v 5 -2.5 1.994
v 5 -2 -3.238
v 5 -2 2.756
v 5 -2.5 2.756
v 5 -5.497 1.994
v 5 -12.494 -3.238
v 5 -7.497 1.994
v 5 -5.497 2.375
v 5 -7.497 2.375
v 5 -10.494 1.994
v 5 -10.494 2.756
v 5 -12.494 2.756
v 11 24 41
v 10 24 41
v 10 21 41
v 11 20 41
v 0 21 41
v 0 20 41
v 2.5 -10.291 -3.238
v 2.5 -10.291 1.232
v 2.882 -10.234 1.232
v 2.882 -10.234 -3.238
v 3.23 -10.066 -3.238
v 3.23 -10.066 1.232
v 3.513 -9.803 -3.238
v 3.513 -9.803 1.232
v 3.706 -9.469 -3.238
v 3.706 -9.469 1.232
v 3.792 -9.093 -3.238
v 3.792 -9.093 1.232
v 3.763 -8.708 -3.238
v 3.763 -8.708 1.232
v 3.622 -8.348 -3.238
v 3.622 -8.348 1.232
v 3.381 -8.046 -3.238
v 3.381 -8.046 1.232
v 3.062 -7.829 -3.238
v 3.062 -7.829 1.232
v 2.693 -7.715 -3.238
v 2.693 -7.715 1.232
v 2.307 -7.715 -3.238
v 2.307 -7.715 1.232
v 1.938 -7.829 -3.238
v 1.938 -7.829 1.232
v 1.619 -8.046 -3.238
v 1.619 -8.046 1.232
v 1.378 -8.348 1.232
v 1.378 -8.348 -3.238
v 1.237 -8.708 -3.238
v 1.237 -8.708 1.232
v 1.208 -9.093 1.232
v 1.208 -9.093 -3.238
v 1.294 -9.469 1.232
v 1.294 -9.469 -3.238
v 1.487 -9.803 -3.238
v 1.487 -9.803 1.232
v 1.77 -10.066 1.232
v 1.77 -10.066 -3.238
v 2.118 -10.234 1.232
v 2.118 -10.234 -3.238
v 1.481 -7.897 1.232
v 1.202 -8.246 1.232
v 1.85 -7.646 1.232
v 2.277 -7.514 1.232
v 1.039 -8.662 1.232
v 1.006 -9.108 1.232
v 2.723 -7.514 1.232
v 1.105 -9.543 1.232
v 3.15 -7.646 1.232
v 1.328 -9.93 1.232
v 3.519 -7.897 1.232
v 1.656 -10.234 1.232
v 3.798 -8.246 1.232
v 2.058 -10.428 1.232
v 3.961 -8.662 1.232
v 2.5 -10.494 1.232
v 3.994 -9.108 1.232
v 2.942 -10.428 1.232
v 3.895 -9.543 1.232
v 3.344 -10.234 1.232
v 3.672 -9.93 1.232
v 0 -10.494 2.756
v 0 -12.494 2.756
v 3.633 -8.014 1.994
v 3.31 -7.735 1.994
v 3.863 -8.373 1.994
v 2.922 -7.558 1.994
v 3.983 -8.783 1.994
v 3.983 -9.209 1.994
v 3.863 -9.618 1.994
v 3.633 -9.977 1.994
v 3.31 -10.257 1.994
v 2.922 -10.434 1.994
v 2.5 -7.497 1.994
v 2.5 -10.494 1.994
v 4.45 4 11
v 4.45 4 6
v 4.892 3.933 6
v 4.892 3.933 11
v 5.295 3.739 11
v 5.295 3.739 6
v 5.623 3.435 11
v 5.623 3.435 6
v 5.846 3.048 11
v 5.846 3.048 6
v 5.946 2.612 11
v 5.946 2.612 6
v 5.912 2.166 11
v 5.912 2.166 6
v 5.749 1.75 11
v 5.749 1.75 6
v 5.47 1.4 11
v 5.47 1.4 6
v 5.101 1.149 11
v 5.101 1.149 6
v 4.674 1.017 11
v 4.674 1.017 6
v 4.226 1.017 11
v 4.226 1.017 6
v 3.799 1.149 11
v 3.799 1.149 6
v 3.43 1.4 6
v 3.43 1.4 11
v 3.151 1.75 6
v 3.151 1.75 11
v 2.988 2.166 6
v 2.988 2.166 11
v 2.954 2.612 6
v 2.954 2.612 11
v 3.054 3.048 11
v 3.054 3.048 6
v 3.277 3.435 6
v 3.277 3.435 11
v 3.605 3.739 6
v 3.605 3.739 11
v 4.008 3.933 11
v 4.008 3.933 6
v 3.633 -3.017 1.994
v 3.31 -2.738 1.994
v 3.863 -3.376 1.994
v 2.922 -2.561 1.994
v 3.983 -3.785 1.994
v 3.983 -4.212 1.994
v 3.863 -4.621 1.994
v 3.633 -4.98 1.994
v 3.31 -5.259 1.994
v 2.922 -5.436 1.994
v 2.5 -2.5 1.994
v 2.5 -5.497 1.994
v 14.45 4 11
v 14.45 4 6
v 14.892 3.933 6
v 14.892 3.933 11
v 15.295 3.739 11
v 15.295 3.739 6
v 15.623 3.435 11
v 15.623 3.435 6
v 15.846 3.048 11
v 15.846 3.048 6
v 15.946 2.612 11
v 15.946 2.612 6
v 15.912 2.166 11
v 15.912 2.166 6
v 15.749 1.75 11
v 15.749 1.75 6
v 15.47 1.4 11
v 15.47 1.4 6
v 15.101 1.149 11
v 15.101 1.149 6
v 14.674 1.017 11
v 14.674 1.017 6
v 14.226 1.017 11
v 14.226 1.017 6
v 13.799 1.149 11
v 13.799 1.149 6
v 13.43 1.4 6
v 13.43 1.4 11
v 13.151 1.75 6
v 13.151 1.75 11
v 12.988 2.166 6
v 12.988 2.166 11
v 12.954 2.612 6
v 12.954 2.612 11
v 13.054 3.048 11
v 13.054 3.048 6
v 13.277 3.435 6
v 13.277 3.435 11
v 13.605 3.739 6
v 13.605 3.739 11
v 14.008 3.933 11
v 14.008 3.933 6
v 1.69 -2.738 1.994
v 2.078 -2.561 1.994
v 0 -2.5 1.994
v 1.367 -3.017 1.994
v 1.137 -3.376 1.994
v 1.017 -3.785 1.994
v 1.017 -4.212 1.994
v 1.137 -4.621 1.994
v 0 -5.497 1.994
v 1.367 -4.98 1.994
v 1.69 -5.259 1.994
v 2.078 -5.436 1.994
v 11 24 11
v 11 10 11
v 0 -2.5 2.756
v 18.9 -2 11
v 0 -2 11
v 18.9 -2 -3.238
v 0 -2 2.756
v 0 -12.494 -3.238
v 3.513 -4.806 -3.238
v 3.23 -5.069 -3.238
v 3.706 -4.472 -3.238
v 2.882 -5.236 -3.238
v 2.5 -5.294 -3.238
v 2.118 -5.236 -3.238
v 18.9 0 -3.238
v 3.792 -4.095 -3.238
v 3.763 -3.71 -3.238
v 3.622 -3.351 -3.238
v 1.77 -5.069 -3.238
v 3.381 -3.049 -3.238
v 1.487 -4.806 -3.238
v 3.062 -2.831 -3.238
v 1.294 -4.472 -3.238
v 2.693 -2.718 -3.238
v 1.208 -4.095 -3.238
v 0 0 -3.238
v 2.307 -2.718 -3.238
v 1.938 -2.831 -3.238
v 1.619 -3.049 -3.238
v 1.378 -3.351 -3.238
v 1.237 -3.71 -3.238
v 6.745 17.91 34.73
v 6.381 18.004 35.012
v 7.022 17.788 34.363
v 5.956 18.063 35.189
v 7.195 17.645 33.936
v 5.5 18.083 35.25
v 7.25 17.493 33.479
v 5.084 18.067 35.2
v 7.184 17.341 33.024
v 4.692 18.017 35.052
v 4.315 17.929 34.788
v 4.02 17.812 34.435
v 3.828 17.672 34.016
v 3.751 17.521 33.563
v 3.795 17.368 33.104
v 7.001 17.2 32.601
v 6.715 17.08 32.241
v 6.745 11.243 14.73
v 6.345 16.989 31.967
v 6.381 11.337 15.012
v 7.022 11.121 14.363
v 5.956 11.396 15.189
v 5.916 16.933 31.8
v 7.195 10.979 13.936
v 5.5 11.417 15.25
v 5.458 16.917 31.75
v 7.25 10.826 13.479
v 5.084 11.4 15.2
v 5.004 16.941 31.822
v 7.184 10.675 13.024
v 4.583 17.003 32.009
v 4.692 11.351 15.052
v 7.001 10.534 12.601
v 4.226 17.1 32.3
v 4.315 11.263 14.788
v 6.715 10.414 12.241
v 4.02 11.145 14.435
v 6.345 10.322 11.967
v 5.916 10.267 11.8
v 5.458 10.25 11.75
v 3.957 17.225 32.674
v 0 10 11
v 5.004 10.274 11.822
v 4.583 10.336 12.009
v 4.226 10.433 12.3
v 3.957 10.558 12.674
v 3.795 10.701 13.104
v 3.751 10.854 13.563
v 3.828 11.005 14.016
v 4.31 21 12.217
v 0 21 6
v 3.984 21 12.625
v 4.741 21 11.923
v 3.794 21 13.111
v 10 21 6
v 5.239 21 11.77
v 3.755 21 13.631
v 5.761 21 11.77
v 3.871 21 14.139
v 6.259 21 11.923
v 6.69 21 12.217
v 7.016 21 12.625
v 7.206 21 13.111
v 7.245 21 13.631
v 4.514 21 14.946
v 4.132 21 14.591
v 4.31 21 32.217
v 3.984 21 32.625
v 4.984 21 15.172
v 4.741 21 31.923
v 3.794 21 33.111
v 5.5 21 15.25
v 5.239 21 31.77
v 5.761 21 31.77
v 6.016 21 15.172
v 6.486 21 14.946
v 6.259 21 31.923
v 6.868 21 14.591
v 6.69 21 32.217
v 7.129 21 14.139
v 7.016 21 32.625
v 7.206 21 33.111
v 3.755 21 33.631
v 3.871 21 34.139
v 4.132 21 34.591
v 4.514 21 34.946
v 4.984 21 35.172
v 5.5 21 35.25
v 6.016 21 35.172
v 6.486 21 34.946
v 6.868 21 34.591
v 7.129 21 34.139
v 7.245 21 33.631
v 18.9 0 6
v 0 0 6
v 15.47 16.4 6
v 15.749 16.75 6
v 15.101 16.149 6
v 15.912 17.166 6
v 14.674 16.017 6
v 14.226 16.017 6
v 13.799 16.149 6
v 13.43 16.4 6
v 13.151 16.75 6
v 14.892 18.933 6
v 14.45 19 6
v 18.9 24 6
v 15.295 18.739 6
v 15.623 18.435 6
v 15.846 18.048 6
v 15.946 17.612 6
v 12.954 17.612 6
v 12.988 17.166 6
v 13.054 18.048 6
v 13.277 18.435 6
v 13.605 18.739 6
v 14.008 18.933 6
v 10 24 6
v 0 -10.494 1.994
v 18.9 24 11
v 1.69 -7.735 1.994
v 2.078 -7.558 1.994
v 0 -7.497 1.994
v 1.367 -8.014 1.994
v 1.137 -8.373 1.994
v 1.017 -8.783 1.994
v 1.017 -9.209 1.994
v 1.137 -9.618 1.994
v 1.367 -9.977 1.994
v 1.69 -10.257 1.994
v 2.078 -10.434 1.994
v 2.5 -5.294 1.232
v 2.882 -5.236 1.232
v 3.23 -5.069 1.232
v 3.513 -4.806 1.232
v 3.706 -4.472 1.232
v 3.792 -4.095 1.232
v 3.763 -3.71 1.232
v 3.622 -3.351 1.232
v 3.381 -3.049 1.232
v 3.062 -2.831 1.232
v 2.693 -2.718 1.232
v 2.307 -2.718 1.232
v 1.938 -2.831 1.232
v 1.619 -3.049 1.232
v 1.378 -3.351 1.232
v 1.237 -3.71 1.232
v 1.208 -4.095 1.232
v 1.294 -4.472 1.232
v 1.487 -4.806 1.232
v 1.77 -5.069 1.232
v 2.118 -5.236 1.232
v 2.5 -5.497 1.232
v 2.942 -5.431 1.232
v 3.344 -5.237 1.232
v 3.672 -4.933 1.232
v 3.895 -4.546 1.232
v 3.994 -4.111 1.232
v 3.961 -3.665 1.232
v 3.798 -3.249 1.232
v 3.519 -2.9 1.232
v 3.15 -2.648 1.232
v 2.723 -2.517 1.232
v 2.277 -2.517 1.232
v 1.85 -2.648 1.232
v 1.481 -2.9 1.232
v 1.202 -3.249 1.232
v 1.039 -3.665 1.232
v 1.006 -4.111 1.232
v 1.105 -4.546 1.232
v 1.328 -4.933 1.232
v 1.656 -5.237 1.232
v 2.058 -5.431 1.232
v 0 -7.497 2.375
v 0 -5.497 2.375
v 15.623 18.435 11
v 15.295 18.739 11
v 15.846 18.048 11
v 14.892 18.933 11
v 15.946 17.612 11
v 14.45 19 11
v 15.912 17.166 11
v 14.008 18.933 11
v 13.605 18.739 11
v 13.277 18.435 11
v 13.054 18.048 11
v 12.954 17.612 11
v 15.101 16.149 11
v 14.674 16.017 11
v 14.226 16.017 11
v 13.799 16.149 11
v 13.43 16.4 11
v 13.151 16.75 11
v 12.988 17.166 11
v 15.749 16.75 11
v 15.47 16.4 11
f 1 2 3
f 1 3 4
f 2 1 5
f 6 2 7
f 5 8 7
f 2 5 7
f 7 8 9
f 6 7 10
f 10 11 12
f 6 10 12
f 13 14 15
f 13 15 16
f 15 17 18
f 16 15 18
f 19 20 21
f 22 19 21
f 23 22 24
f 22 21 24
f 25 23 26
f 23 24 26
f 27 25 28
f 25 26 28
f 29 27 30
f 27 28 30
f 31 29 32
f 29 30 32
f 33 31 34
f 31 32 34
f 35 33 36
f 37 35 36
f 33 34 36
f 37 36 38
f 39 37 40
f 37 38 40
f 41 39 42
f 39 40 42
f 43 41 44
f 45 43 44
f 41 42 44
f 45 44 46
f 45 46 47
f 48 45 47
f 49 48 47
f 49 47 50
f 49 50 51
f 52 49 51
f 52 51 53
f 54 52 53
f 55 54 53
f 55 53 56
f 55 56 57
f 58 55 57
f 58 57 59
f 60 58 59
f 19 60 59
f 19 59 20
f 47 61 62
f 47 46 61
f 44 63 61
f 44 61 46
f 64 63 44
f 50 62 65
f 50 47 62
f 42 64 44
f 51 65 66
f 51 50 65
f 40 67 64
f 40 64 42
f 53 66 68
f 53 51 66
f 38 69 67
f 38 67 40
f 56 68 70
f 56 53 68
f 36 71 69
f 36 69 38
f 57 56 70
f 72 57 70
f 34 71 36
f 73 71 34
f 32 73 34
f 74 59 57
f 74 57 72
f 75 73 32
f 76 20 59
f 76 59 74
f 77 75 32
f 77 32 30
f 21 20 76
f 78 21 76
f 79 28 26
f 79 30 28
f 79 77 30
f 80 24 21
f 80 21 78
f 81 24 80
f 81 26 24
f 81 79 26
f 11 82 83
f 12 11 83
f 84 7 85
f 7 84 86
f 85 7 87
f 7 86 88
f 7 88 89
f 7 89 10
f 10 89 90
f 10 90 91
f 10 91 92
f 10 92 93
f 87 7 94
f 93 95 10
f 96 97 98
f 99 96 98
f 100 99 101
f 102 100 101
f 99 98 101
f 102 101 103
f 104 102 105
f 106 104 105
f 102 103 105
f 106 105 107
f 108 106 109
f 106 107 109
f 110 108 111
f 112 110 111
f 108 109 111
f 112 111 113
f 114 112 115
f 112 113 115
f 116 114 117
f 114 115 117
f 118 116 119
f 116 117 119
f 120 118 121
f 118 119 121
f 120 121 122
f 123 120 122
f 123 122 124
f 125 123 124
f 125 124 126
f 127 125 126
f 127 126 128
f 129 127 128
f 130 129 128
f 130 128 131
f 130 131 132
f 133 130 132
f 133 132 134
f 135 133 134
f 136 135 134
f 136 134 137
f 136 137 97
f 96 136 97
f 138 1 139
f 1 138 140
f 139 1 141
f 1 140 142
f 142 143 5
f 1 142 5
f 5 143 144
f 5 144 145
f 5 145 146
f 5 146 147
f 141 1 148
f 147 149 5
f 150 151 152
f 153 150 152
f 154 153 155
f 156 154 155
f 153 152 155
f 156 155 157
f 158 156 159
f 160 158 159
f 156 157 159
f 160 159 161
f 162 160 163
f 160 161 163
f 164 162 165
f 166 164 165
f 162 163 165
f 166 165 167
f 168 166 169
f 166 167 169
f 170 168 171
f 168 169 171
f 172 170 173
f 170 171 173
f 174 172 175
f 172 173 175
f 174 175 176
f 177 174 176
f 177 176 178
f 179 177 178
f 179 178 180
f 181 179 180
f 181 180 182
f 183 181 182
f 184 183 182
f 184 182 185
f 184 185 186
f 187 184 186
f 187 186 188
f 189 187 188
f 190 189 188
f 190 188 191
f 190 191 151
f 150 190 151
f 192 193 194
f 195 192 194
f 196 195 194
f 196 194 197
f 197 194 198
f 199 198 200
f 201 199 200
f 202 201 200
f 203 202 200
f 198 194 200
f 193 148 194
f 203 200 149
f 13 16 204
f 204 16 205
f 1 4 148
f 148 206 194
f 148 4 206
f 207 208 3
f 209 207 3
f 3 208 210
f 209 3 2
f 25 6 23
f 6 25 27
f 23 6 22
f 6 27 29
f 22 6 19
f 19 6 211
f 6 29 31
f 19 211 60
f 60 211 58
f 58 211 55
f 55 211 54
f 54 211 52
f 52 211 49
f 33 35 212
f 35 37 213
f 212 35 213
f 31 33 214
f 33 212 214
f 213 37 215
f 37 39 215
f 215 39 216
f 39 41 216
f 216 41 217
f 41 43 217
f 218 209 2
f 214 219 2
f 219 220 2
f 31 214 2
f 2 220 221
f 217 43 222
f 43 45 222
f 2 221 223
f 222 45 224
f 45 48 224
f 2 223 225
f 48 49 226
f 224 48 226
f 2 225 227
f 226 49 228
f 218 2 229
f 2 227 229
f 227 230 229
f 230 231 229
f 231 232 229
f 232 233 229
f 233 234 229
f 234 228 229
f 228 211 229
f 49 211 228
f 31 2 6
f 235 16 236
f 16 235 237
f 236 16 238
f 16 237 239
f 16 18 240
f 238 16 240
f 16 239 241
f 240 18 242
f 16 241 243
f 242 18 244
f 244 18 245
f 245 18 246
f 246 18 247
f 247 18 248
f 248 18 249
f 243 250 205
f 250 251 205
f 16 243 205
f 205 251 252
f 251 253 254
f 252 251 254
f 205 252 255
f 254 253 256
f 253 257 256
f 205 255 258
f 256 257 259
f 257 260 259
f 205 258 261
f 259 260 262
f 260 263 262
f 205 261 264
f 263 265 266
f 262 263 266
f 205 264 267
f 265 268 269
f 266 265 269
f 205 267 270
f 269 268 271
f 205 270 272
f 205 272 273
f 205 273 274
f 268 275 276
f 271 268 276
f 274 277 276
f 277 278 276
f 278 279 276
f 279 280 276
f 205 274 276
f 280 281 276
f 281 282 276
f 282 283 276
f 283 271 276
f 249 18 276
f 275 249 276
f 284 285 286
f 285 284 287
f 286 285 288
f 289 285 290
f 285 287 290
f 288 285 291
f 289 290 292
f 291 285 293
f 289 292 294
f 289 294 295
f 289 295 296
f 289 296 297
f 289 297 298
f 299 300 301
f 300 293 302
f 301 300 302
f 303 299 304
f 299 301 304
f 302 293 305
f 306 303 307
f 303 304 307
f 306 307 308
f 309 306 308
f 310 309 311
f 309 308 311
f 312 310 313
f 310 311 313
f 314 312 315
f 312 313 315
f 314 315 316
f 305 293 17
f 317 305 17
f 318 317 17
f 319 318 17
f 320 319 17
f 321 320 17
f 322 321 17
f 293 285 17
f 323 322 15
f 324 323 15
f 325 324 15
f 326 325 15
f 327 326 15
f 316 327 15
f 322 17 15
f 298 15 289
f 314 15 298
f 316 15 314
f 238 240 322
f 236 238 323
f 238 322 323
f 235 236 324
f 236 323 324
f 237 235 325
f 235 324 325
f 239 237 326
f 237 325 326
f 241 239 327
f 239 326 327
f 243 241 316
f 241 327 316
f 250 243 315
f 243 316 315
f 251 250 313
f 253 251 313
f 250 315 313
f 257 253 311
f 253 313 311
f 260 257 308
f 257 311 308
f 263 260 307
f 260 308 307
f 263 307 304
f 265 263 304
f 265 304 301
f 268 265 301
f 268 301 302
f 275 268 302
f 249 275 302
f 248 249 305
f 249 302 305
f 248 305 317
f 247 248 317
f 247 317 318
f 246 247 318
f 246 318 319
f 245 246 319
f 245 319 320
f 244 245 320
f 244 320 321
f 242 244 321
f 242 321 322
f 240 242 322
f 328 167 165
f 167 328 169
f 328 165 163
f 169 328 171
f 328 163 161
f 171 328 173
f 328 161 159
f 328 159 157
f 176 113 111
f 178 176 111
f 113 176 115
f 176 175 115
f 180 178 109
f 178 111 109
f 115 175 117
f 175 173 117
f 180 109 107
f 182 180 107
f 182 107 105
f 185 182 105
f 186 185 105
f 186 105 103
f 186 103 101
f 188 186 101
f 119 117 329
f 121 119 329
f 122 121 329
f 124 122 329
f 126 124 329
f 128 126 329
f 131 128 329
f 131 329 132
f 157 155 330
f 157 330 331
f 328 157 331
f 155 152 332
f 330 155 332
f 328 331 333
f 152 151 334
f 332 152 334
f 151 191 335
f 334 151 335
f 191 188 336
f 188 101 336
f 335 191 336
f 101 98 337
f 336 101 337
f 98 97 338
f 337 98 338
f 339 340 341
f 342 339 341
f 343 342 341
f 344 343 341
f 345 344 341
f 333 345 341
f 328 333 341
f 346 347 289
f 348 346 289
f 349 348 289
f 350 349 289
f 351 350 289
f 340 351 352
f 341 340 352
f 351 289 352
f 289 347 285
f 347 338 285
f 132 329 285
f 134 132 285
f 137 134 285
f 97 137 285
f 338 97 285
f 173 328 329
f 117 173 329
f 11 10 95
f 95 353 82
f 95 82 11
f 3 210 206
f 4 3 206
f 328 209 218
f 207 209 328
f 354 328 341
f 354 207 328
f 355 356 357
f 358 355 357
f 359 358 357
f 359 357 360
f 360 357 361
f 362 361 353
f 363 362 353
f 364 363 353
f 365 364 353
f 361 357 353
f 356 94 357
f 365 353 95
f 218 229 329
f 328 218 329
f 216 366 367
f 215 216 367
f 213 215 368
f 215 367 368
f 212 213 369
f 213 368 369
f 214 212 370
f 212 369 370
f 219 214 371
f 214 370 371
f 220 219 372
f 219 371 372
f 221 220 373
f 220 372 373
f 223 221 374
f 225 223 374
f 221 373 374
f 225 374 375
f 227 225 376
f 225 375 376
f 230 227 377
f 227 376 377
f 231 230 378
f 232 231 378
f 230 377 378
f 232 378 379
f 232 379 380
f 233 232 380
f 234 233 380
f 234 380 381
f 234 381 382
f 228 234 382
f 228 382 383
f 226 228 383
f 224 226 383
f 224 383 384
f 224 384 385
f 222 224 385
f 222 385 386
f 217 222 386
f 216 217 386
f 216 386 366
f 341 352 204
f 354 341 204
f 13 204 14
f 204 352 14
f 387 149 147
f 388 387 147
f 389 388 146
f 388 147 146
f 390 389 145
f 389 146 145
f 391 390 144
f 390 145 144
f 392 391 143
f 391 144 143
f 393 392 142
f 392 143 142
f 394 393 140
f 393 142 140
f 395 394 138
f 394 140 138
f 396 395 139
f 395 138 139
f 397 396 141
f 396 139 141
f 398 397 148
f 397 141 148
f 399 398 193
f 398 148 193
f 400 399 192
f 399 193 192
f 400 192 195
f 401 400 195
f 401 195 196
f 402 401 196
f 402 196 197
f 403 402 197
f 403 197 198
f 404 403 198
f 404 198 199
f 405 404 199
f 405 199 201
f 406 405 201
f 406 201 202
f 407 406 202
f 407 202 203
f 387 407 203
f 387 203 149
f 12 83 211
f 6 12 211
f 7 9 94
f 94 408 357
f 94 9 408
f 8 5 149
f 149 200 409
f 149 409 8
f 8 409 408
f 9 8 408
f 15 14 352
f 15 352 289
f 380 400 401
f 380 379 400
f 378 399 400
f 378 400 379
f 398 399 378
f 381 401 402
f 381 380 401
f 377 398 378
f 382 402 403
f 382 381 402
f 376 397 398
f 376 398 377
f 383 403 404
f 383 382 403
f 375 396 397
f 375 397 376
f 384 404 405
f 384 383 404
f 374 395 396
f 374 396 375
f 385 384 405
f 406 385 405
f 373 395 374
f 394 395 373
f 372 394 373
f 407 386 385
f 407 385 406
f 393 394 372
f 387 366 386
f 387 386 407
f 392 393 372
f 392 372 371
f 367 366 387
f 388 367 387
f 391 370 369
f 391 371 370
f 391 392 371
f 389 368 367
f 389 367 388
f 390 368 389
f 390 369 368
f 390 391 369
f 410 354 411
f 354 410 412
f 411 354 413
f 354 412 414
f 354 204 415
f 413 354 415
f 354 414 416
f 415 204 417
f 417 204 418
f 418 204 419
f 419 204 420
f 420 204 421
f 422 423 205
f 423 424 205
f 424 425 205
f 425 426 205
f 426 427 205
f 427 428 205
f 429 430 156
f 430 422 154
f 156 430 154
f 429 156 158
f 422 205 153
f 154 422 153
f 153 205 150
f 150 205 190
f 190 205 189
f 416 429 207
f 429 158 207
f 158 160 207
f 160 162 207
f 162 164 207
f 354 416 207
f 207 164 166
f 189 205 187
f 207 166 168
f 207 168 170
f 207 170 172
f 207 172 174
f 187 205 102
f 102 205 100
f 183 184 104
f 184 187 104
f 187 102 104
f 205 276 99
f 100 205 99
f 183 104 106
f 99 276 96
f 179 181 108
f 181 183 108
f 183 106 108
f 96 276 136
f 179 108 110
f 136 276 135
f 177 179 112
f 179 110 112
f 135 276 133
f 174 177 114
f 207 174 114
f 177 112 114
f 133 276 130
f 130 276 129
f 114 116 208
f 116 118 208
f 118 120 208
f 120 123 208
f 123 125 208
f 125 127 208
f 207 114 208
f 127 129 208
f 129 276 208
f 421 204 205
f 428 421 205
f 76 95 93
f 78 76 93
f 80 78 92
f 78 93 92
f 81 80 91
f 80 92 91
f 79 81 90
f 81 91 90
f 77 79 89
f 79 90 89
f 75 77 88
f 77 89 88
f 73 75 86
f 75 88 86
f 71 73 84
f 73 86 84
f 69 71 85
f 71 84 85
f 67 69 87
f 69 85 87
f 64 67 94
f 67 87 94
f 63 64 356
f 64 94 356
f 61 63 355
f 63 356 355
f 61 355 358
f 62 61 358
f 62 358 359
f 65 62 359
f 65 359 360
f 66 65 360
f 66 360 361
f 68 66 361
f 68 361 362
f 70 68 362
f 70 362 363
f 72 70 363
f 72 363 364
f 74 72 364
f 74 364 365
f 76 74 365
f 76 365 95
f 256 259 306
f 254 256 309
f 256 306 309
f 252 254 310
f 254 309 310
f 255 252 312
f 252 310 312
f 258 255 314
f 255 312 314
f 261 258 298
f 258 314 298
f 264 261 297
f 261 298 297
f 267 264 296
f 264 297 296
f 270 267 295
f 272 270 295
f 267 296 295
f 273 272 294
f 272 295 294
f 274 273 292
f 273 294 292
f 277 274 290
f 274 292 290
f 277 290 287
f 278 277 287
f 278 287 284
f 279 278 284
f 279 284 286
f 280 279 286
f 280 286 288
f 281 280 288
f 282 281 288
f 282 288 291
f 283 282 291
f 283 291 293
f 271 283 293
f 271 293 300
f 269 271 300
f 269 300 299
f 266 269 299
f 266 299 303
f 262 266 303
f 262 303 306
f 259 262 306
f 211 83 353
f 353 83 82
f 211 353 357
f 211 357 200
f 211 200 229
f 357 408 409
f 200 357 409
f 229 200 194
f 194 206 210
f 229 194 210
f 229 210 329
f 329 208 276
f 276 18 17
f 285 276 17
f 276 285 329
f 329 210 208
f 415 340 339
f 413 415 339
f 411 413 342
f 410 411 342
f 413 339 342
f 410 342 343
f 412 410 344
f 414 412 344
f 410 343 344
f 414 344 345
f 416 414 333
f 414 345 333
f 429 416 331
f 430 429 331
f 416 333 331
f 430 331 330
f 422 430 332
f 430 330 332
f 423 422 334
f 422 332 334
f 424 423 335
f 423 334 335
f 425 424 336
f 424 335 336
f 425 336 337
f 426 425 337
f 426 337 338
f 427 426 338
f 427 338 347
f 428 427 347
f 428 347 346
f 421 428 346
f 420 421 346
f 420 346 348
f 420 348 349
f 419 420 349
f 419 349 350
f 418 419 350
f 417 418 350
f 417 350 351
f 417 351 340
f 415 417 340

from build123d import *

# Parameters (mm, degrees)
PAD_DEPTH       = 18.9
SKETCH001_W     = 30
SKETCH001_H     = 7.9
POCKET_DEPTH    = 26.001
POCKET001_DEPTH = 44.239
SKETCH003_R     = 1.75
POCKET002_DEPTH = 33.4954
SKETCH005_R     = 1.5
POCKET004_DEPTH = 35.001
SKETCH007_R     = 1.2954
SKETCH007_W     = 10.4944
SKETCH007_H     = 13.9
POCKET005_DEPTH = 5.9954
SKETCH008_R     = 1.4986
POCKET006_DEPTH = 0.762


with BuildPart() as part:
    # Sketch → Pad (new body)
    with BuildSketch(Plane.YZ):
        Polygon((-2.5, 2.7564), (-2.5, 1.9944), (-5.4972, 1.9944), (-5.4972, 2.3754), (-7.4972, 2.3754), (-7.4972, 1.9944), (-10.4944, 1.9944), (-10.4944, 2.7564), (-12.4944, 2.7564), (-12.4944, -3.238), (0, -3.238), (0, 6), (24, 6), (24, 41), (20, 41), (10, 11), (-2, 11), (-2, 2.7564), align=None)
    extrude(amount=PAD_DEPTH)

    # Sketch001 (on Face17 of Pad) → Pocket (cut, through all)
    with BuildSketch(Plane(origin=(0, -2, 0), x_dir=(0, 0, -1), z_dir=(0, -1, 0))):
        with Locations((-26, 14.95)):
            Rectangle(SKETCH001_W, SKETCH001_H)
    extrude(amount=-POCKET_DEPTH, mode=Mode.SUBTRACT)

    # Sketch002 (on Face18 of Pocket) → Pocket001 (cut, through all)
    with BuildSketch(Plane(origin=(0, 0, 41), x_dir=(0, -1, 0), z_dir=(0, 0, 1))):
        Polygon((-21, 10), (-21, 1), (-21, 0), (-24, 0), (-24, 1), (-24, 10), align=None)
    extrude(amount=-POCKET001_DEPTH, mode=Mode.SUBTRACT)

    # Sketch003 (on Face26 of Pocket001) → Pocket002 (cut, through all)
    with BuildSketch(Plane.ZX.offset(21)):
        with Locations((13.5, 5.5)):
            Circle(SKETCH003_R)
        with Locations((33.5, 5.5)):
            Circle(SKETCH003_R)
    extrude(amount=-POCKET002_DEPTH, mode=Mode.SUBTRACT)

    # Sketch005 → Pocket004 (cut, through all)
    with BuildSketch(Plane.YX.offset(-6)):
        with Locations((2.5, 14.45)):
            Circle(SKETCH005_R)
        with Locations((17.5, 14.45)):
            Circle(SKETCH005_R)
        with Locations((2.5, 4.45)):
            Circle(SKETCH005_R)
    extrude(amount=-POCKET004_DEPTH, mode=Mode.SUBTRACT)

    # Sketch007 (on Face16 of Pocket004) → Pocket005 (cut, through all)
    with BuildSketch(Plane(origin=(0, 0, 2.7564), x_dir=(0, -1, 0), z_dir=(0, 0, 1))):
        with Locations((8.9958, 2.5)):
            Circle(SKETCH007_R)
        with Locations((3.9986, 2.5)):
            Circle(SKETCH007_R)
        with Locations((7.2472, 11.95)):
            Rectangle(SKETCH007_W, SKETCH007_H)
    extrude(amount=-POCKET005_DEPTH, mode=Mode.SUBTRACT)

    # Sketch008 (on Face17 of Pocket005) → Pocket006 (cut)
    with BuildSketch(Plane(origin=(0, 0, 1.9944), x_dir=(0, -1, 0), z_dir=(0, 0, 1))):
        with Locations((8.9958, 2.5)):
            Circle(SKETCH008_R)
        with Locations((3.9986, 2.5)):
            Circle(SKETCH008_R)
    extrude(amount=-POCKET006_DEPTH, mode=Mode.SUBTRACT)


solid = part.part
